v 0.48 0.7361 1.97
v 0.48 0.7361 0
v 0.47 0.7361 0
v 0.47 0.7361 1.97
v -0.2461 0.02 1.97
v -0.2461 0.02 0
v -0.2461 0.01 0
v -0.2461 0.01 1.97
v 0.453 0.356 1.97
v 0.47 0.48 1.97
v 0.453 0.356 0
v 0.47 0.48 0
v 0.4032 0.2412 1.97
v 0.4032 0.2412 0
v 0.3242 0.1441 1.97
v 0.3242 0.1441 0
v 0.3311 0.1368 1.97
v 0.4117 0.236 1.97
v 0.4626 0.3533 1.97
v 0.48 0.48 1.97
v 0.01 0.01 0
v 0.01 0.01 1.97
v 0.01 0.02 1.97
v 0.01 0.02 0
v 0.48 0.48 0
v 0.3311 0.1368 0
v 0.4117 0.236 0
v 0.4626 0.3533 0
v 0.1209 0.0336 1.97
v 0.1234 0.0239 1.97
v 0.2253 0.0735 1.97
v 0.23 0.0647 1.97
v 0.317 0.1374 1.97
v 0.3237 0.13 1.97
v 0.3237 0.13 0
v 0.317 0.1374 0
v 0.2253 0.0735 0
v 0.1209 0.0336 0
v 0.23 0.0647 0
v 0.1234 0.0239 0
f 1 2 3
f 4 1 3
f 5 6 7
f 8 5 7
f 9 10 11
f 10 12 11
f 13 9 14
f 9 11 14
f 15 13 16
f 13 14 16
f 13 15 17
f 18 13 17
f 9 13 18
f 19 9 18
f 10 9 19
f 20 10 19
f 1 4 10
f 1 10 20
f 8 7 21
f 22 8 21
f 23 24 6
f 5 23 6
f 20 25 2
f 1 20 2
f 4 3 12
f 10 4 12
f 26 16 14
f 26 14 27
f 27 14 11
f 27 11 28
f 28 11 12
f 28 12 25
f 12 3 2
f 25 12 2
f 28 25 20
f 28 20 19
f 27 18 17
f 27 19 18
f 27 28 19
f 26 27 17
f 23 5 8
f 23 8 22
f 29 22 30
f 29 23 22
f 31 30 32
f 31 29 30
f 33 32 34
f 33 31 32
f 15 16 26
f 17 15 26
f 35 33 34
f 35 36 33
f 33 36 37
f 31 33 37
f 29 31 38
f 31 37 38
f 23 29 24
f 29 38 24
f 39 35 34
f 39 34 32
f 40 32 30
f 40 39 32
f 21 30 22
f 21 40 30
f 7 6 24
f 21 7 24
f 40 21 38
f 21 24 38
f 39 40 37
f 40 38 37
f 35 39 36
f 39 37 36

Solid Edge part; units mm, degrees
sketch "Sketch1" plane through (0, 0, 0) normal (0, 0, 1) x (1, 0, 0)
  arc A0 (0.3311, 0.1368) -> (0.48, 0.48) centre (0.01, 0.48) ccw
  line L0 (0.48, 0.48) -> (0.48, 0.7361)
  line L1 (0.48, 0.7361) -> (0.47, 0.7361)
  line L2 (0.47, 0.7361) -> (0.47, 0.48)
  arc A1 (0.47, 0.48) -> (0.3242, 0.1441) centre (0.01, 0.48) cw
  line L3 (0.3242, 0.1441) -> (0.3311, 0.1368)
  line L4 (-0.2461, 0.01) -> (0.01, 0.01)
  arc A2 (0.01, 0.01) -> (0.3237, 0.13) centre (0.01, 0.48) ccw
  line L5 (0.317, 0.1374) -> (0.3237, 0.13)
  arc A3 (0.317, 0.1374) -> (0.01, 0.02) centre (0.01, 0.48) cw
  line L6 (0.01, 0.02) -> (-0.2461, 0.02)
  line L7 (-0.2461, 0.02) -> (-0.2461, 0.01)
  dimension "D1" = 0.01
extrude "Protrusion1" add sketch "Sketch1" along normal blind 1.97
